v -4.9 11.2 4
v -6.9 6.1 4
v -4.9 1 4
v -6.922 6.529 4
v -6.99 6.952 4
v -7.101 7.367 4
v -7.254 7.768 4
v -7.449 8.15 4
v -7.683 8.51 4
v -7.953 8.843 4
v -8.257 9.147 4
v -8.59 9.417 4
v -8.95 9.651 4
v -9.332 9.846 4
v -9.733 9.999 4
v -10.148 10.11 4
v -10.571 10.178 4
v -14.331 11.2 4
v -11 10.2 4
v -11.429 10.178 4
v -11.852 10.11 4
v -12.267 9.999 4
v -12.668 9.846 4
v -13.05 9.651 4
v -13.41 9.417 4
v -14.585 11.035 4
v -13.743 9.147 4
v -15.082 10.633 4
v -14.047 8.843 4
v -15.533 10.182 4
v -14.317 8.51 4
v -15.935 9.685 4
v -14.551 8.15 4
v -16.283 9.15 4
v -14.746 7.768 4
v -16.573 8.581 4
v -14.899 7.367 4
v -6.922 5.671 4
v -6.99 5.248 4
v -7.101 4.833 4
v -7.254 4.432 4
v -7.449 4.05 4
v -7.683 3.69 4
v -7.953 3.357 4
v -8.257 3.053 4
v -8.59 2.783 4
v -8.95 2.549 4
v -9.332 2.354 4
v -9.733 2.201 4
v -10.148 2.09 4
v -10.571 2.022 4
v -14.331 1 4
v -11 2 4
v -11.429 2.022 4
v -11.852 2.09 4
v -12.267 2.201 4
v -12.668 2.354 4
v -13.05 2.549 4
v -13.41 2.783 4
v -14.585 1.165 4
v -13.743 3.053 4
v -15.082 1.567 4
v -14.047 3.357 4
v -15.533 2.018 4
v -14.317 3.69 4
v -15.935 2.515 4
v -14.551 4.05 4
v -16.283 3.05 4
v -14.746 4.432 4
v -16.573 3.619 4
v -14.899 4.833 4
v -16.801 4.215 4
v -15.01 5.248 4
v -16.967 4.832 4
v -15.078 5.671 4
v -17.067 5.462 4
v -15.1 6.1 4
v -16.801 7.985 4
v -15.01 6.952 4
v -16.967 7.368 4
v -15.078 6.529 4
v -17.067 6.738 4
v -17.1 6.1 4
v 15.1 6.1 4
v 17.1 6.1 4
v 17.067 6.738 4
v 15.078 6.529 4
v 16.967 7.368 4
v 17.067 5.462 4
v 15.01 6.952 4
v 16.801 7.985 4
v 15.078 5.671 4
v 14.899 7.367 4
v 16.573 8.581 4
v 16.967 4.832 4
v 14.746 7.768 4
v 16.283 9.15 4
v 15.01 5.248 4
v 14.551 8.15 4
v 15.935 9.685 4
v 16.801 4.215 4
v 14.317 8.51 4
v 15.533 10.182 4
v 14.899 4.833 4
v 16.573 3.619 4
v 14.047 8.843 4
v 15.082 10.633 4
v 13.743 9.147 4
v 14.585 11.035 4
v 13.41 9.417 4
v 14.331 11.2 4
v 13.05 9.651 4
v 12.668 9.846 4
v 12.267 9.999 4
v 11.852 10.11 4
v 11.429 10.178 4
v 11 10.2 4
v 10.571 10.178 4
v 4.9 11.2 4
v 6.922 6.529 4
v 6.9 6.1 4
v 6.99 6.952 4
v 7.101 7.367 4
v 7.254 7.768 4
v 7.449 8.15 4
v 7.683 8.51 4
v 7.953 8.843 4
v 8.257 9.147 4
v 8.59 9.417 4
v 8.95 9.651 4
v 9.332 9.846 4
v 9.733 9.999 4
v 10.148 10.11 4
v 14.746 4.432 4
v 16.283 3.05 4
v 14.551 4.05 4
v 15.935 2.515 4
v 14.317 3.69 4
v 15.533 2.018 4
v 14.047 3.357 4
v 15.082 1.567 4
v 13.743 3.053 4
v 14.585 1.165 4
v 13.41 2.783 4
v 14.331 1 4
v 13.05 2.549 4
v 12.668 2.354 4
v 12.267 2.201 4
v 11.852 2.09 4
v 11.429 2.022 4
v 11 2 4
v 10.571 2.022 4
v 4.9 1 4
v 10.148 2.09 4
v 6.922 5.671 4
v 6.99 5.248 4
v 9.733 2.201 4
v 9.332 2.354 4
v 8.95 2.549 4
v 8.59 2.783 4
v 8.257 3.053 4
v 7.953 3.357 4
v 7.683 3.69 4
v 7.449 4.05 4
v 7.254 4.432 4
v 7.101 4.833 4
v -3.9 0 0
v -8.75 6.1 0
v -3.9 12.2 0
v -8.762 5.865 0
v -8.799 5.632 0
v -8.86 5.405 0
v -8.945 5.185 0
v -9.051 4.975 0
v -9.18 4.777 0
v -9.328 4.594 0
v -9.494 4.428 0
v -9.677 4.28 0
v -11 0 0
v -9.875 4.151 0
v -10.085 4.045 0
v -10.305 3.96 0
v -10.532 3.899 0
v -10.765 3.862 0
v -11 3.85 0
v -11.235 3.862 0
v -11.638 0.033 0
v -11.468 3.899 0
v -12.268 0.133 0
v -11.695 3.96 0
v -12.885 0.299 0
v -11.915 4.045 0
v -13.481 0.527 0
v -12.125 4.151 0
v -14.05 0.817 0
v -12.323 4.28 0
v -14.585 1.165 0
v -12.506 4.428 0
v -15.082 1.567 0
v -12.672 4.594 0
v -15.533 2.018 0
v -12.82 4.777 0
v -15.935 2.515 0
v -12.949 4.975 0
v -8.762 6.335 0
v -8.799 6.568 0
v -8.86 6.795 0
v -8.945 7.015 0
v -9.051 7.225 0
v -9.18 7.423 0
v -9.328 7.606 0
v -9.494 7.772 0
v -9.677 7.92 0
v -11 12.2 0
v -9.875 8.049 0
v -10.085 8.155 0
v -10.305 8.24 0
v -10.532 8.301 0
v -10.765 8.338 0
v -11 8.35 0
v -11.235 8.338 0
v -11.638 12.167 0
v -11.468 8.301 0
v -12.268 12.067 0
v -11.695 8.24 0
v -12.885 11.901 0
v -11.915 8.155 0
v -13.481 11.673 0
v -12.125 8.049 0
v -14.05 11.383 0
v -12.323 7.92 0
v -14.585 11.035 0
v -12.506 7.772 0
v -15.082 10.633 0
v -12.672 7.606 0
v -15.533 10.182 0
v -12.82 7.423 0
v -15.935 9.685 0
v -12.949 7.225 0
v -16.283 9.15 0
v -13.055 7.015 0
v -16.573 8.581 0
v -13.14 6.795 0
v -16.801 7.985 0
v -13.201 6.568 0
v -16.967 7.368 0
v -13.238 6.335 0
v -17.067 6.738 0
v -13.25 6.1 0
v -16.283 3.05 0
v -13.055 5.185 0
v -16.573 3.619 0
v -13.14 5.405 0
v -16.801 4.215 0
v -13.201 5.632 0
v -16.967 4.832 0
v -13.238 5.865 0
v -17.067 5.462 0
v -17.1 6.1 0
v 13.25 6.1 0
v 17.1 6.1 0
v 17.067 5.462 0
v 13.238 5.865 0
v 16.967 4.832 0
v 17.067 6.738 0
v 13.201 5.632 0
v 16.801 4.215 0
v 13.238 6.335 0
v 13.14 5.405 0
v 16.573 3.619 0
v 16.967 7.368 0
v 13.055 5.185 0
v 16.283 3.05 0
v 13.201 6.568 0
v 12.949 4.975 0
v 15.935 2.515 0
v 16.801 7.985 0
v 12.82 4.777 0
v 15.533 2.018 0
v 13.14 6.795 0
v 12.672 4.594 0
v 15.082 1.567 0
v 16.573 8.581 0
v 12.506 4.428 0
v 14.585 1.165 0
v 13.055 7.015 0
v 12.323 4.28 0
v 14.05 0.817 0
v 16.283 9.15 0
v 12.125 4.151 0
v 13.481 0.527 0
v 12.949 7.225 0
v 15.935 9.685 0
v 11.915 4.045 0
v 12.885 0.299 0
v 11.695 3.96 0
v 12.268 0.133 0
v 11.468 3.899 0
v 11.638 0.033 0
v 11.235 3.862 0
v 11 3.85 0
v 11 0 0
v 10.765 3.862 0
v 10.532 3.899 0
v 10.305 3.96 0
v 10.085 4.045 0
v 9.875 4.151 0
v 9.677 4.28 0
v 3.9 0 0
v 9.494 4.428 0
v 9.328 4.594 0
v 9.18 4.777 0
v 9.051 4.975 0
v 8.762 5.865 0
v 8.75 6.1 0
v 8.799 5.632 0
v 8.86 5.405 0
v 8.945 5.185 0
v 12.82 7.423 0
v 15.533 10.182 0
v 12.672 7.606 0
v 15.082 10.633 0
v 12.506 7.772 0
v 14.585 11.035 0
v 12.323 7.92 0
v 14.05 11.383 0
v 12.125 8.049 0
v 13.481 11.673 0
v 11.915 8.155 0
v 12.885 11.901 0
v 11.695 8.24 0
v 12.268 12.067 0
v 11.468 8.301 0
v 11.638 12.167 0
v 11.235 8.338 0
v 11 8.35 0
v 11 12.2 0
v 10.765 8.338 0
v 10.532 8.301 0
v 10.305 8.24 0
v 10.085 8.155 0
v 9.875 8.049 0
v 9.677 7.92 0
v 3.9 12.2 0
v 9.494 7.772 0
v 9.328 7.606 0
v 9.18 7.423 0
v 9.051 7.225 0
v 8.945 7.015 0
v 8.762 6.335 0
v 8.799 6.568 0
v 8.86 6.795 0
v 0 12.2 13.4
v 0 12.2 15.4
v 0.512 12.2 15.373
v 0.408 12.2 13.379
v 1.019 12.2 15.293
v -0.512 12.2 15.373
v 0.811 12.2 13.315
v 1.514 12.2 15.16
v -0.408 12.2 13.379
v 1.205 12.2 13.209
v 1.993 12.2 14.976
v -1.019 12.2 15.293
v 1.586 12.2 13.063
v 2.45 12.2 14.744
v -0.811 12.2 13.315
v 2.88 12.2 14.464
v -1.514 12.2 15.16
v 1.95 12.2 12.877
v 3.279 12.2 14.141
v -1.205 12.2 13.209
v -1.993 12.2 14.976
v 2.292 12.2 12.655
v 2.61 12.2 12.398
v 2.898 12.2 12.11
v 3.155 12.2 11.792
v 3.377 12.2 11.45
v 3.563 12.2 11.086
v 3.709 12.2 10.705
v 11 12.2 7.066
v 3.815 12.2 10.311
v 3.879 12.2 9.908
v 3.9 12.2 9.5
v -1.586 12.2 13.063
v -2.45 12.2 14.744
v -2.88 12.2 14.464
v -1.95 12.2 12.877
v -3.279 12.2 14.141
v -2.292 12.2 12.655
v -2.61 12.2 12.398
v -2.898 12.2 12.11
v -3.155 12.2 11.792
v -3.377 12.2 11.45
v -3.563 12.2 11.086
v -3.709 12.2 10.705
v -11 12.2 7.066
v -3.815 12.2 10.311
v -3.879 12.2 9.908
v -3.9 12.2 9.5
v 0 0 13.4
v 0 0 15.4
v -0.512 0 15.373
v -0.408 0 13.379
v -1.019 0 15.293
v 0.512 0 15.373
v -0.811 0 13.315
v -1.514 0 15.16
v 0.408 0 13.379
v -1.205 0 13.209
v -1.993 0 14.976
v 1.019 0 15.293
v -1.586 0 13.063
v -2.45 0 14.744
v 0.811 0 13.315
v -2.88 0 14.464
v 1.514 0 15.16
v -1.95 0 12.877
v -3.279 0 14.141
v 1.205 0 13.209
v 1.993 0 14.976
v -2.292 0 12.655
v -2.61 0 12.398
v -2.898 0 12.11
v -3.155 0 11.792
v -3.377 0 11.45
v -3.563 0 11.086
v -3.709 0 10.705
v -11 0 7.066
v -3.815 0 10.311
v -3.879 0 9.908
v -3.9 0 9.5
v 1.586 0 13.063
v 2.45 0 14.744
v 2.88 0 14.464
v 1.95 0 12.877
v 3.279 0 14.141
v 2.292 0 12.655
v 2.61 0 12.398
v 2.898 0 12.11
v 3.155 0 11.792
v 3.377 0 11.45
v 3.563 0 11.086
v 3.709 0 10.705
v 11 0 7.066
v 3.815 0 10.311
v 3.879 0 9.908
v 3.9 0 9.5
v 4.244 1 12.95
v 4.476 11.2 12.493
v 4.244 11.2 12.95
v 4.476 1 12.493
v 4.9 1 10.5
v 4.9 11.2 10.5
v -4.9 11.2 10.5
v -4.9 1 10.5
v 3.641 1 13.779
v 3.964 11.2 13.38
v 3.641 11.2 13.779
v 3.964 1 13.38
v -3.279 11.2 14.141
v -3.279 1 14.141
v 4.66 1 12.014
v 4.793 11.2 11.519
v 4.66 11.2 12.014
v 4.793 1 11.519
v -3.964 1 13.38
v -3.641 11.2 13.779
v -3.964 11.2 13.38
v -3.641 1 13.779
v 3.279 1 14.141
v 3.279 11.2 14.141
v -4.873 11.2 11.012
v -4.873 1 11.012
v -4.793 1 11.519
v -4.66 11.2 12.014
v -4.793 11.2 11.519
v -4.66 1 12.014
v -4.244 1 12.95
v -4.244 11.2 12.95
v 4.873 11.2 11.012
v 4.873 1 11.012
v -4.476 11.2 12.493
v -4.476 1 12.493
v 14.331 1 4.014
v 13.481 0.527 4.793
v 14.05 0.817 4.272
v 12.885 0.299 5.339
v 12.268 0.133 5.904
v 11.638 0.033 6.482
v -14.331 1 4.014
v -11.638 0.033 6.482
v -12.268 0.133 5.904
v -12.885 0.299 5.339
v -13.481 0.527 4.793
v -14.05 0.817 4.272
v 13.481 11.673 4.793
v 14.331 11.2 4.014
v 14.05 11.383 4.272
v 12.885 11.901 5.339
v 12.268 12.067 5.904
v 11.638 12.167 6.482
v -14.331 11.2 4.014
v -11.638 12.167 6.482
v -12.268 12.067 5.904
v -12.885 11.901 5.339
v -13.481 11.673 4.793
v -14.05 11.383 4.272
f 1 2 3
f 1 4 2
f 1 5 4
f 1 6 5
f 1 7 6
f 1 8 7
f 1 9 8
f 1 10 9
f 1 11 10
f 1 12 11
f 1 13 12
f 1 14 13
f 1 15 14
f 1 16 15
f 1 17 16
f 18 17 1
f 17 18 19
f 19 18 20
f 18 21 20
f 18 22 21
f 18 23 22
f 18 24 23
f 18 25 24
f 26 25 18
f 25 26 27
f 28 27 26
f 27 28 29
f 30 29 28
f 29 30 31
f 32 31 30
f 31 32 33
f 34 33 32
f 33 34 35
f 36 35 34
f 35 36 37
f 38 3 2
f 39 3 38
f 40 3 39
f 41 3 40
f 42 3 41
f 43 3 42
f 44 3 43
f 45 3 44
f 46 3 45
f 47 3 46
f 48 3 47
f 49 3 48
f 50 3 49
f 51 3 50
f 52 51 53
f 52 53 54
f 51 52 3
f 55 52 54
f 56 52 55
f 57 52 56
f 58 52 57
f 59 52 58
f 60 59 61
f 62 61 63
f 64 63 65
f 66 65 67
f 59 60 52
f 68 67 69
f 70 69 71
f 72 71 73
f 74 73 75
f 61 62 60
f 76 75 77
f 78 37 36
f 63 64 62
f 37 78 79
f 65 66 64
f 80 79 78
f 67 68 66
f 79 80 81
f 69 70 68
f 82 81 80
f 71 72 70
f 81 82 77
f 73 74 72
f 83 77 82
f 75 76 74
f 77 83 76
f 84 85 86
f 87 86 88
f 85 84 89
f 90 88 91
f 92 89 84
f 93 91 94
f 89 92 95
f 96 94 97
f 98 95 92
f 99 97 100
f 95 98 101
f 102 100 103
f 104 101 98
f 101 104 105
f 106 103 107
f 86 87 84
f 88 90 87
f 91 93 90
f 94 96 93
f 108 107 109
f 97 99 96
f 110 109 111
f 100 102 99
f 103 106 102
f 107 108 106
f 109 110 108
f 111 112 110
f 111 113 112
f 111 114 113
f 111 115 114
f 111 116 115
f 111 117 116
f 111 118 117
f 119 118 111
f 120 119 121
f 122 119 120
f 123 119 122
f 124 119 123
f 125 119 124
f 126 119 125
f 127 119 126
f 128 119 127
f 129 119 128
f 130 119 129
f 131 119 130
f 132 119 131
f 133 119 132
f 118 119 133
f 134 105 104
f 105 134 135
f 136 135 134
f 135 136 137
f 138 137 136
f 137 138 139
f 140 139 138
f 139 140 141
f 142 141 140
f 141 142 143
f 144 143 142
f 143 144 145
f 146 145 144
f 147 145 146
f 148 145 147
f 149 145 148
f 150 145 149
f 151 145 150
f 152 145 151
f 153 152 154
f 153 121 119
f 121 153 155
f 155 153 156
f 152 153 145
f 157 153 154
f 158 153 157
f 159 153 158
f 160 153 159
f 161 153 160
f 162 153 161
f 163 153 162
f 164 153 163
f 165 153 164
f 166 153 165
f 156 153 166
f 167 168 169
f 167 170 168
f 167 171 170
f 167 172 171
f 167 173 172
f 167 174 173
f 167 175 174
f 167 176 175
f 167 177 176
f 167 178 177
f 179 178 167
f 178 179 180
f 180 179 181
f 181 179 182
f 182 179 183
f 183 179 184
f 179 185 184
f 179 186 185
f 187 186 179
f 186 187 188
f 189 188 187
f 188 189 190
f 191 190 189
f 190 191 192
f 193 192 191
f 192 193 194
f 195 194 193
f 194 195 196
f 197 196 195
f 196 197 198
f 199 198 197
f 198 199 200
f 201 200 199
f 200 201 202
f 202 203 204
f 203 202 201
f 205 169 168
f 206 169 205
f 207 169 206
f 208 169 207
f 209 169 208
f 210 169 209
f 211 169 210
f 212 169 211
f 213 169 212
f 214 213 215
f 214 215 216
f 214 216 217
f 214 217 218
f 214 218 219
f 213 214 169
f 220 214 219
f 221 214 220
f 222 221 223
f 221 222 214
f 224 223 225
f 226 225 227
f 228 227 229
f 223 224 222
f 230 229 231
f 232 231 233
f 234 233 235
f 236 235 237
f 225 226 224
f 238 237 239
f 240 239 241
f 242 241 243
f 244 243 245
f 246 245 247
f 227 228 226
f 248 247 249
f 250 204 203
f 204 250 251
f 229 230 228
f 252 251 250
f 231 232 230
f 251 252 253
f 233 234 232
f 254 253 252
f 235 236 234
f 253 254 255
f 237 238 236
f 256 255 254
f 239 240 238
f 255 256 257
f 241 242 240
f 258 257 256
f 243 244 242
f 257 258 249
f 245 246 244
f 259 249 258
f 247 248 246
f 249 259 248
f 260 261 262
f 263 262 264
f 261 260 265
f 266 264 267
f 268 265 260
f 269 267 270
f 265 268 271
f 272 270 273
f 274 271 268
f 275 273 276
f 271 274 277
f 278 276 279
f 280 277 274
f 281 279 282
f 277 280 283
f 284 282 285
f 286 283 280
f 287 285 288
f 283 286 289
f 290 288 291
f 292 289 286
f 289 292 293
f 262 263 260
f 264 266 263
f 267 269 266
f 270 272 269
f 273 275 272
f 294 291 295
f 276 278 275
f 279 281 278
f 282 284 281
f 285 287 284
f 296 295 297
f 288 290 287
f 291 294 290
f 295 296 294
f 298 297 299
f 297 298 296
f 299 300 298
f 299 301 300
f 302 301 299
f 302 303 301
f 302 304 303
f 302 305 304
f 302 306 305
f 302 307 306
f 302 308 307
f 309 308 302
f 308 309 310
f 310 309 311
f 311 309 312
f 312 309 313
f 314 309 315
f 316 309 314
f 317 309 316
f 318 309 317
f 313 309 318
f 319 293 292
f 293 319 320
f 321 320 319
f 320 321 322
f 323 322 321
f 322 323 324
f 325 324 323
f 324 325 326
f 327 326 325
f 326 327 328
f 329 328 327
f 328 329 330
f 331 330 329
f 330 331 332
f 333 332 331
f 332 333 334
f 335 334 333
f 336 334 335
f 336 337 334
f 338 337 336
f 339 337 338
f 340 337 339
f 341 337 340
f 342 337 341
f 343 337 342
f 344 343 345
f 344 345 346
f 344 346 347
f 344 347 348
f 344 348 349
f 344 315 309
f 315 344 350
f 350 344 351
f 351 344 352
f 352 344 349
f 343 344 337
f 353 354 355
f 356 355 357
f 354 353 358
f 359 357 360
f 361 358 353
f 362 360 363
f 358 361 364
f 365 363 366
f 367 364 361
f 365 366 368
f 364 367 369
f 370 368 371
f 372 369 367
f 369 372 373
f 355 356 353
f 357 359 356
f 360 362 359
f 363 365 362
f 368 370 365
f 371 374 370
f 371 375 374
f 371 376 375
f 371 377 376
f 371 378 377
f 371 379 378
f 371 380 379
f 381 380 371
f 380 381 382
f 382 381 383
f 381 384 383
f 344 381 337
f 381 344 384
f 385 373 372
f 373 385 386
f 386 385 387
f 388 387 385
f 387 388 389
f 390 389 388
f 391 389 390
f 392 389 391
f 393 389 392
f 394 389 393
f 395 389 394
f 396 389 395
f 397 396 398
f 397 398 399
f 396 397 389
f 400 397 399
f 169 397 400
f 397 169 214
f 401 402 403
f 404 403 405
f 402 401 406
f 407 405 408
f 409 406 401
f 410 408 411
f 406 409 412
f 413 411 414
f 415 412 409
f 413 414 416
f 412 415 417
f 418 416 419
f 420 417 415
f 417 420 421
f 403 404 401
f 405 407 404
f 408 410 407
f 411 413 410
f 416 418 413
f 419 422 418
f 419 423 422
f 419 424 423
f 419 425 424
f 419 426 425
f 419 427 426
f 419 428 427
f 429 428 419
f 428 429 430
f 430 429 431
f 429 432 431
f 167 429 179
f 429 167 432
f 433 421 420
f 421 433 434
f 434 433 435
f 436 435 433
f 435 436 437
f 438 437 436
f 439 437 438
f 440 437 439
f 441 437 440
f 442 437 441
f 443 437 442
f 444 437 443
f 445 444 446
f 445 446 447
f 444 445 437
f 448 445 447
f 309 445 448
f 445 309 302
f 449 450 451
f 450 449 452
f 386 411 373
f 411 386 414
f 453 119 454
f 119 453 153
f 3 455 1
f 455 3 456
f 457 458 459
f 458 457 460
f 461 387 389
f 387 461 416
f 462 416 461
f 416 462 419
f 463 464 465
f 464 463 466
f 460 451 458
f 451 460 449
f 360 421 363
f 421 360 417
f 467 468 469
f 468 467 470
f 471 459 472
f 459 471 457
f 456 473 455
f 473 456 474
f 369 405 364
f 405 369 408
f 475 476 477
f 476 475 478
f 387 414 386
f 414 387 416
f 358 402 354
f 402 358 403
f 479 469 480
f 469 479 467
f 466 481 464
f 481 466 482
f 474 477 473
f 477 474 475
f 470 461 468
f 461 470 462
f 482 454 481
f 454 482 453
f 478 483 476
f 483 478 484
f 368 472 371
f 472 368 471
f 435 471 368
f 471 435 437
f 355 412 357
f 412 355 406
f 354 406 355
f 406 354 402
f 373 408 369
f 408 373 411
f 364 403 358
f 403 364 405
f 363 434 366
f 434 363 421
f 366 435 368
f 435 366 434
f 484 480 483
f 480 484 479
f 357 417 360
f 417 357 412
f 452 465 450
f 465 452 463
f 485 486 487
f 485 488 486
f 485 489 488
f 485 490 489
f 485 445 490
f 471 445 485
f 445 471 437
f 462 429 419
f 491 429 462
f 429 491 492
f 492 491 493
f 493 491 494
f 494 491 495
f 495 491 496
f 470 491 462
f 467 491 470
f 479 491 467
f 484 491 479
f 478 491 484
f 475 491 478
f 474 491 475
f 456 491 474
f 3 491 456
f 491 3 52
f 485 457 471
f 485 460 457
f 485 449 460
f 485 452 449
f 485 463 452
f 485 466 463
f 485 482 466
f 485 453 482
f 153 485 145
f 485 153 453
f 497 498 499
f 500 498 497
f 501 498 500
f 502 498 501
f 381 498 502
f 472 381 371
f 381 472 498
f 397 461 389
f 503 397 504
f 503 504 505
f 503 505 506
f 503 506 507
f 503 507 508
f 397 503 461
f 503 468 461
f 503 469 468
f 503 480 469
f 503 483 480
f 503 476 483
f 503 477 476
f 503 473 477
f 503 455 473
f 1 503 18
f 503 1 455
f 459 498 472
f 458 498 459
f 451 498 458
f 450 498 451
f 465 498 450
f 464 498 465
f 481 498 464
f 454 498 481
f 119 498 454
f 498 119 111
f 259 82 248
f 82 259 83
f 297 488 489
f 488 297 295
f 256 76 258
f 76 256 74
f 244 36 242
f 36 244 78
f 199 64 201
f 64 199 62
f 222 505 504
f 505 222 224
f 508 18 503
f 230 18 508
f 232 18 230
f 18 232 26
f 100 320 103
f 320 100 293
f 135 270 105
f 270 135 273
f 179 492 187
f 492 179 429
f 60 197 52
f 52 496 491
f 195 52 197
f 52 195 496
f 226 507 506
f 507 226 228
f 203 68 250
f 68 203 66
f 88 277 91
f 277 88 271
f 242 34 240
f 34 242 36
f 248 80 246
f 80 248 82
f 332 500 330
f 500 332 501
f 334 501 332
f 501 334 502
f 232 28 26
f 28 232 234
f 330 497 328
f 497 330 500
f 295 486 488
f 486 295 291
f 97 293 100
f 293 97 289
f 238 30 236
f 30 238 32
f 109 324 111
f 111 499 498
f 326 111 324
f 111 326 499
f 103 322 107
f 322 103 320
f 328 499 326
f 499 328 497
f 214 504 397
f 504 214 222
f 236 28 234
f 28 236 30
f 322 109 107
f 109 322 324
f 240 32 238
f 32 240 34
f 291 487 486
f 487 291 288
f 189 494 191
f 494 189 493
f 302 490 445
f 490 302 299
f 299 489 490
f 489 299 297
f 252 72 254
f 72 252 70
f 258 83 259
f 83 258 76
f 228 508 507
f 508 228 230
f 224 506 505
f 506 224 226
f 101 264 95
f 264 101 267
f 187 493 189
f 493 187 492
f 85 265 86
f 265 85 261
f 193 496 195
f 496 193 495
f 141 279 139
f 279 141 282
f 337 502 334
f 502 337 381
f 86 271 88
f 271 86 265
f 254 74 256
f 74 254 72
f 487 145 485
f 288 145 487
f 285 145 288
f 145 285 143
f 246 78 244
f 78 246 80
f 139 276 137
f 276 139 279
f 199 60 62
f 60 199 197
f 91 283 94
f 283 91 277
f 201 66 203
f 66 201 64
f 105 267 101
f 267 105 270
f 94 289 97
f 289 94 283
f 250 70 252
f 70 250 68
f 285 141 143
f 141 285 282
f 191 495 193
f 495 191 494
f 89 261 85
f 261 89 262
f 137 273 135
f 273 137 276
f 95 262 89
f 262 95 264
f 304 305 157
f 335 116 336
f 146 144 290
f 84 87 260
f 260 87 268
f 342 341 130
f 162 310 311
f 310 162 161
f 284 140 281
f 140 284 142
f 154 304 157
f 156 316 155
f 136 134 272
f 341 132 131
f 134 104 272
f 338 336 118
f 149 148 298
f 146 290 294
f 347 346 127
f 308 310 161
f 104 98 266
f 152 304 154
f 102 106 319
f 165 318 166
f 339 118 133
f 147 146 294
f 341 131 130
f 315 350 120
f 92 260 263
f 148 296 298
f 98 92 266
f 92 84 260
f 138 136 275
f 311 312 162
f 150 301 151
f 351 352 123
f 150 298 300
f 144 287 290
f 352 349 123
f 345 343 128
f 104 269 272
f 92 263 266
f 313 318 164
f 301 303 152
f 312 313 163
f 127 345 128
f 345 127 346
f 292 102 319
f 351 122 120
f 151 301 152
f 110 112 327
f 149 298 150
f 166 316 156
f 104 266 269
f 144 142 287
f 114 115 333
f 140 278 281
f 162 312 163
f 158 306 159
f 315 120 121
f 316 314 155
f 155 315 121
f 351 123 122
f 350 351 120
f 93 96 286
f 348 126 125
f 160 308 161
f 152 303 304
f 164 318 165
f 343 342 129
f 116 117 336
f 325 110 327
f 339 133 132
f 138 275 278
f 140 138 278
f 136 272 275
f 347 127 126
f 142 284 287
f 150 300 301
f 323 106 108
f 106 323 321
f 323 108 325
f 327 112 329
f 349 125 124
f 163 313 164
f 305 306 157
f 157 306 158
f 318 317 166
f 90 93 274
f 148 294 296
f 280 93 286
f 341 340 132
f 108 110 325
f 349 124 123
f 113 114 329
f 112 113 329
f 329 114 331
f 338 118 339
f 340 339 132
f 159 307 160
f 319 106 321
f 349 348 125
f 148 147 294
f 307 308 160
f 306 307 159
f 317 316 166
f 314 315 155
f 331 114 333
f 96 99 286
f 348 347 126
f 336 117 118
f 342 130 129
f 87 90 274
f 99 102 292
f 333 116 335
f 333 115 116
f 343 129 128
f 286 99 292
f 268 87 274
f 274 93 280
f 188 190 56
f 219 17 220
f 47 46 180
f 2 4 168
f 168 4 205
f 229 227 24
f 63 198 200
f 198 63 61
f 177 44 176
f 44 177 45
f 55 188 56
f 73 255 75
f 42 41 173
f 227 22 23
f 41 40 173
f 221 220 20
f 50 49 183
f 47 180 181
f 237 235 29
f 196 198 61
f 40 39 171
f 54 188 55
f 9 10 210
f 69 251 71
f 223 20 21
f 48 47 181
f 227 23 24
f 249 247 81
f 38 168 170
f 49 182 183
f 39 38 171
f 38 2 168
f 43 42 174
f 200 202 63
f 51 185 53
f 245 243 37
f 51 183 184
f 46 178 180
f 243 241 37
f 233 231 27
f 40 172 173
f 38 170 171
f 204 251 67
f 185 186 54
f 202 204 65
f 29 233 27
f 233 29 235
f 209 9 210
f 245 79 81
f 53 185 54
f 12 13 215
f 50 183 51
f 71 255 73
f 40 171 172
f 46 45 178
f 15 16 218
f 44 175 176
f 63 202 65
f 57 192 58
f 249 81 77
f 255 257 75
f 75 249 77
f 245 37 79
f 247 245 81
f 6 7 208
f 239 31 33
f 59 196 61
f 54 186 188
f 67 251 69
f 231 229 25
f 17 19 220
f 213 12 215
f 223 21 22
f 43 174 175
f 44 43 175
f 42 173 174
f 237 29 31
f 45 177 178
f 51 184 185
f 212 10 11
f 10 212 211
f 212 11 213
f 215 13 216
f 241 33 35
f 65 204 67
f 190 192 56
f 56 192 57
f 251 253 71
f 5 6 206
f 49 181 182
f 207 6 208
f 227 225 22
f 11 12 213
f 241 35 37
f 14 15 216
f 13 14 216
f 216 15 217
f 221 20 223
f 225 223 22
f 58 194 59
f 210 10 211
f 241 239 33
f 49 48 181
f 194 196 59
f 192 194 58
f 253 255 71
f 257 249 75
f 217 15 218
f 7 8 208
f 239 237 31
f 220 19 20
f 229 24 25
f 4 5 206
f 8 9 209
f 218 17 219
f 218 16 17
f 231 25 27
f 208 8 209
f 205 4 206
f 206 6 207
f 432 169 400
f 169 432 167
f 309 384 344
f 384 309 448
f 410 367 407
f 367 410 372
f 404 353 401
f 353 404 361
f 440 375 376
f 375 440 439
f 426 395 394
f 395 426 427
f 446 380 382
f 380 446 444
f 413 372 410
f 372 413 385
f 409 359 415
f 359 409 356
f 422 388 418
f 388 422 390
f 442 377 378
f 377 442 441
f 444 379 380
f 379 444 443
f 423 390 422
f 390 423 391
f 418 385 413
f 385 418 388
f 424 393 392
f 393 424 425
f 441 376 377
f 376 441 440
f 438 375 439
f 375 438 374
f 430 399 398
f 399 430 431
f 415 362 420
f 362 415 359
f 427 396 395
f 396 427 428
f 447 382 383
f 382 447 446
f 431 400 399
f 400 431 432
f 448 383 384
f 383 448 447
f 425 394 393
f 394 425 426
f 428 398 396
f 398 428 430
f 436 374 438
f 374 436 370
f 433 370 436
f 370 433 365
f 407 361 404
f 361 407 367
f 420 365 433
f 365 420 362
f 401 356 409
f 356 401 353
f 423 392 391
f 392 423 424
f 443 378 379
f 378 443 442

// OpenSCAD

//The diameter of your pipe
pipe_d = 7.8;

//The lift your pipe from surface
pipe_lift = 5.6;

//Measurements for the screw

//Screw Thread Diameter
screw_d = 4.5;

//Screw Head Diameter
screwh_d = 8.2; //8.2

//Screw Coutersunk depth
screw_trans = 4;

//Generate support for the bridge
support_d = 0;

//Thickness of the base
base_thickness = 4;

//Thickness of the structure
mount_t = 1; //mount thickness




base_thick = max(base_thickness,screw_trans);

pipe_r = pipe_d/2;

mount_d = screwh_d + mount_t *2 + 2; //mount depth

mount_w = pipe_d + (mount_d + mount_t) * 2;  //mount wings width

mount_w_trust =  mount_w - mount_d + 2*sqrt(pow(mount_d/2,2)-pow(mount_d/2-mount_t,2));
    //mount trust width
echo( mount_w_trust);

pipe_rplus = pipe_r + mount_t;//outer pipe

$fn = 60;
module screw (){
	//head
	cylinder(h = 40, r = screwh_d/2, center=false);

	//transition
	
	translate([0,0, -screw_trans])
	cylinder(h = screw_trans, r2 = screwh_d/2, r1 = screw_d /2, center=false);

	//screw shaft
	translate([0, 0, -40- screw_trans])
	cylinder(h = 40, r = screw_d/2, center=false);

}


module trust(){

	//mount_w_trust = mount_w - 6;
	
	hull()
	{
		translate([0, 0, pipe_rplus + pipe_lift])
		rotate([-90, 0, 0])
		cylinder(r = pipe_rplus, h = mount_t, center=false);


		translate([-mount_w_trust/2, 0, 0])
		cube([mount_w_trust,mount_t,base_thick]);
	}
}

//Tunnel
module pipe(piper = pipe_r, heig = 20) {
	hull()
	{
		translate([0, 0, piper + pipe_lift])
		rotate([-90, 0, 0])
		cylinder(r = piper, h = heig, center=false);

		translate([-piper, 0, 0])
		cube([piper*2,heig,1]);
	}
}


module body_raw() {
	translate([-mount_w /2, 0, 0])
	cube([mount_w,mount_d , base_thick]);

	pipe(piper = pipe_rplus, heig = mount_d);

	trust();
	translate([0, mount_d- mount_t, 0])
	trust();
}

module body() {
	intersection() {
		body_raw();
		translate([-(mount_w -mount_d)/2, mount_d/2, 0])
		hull() {
			cylinder( h = pipe_rplus * 2+pipe_lift, r = mount_d/2, center=false);
			translate([mount_w-mount_d, 0, 0])
			cylinder( h = pipe_rplus * 2+pipe_lift, r = mount_d/2, center=false);
		}
	}
}


difference()
{
	body();
	
	//internal pipe
	translate([0, support_d,0])
	pipe(pipe_d/2,mount_d-support_d * 2);
	
	translate([pipe_rplus + mount_d/2, mount_d /2, base_thick])
	#screw();

	translate([-pipe_rplus - mount_d/2, mount_d /2, base_thick])
	#screw();
}

